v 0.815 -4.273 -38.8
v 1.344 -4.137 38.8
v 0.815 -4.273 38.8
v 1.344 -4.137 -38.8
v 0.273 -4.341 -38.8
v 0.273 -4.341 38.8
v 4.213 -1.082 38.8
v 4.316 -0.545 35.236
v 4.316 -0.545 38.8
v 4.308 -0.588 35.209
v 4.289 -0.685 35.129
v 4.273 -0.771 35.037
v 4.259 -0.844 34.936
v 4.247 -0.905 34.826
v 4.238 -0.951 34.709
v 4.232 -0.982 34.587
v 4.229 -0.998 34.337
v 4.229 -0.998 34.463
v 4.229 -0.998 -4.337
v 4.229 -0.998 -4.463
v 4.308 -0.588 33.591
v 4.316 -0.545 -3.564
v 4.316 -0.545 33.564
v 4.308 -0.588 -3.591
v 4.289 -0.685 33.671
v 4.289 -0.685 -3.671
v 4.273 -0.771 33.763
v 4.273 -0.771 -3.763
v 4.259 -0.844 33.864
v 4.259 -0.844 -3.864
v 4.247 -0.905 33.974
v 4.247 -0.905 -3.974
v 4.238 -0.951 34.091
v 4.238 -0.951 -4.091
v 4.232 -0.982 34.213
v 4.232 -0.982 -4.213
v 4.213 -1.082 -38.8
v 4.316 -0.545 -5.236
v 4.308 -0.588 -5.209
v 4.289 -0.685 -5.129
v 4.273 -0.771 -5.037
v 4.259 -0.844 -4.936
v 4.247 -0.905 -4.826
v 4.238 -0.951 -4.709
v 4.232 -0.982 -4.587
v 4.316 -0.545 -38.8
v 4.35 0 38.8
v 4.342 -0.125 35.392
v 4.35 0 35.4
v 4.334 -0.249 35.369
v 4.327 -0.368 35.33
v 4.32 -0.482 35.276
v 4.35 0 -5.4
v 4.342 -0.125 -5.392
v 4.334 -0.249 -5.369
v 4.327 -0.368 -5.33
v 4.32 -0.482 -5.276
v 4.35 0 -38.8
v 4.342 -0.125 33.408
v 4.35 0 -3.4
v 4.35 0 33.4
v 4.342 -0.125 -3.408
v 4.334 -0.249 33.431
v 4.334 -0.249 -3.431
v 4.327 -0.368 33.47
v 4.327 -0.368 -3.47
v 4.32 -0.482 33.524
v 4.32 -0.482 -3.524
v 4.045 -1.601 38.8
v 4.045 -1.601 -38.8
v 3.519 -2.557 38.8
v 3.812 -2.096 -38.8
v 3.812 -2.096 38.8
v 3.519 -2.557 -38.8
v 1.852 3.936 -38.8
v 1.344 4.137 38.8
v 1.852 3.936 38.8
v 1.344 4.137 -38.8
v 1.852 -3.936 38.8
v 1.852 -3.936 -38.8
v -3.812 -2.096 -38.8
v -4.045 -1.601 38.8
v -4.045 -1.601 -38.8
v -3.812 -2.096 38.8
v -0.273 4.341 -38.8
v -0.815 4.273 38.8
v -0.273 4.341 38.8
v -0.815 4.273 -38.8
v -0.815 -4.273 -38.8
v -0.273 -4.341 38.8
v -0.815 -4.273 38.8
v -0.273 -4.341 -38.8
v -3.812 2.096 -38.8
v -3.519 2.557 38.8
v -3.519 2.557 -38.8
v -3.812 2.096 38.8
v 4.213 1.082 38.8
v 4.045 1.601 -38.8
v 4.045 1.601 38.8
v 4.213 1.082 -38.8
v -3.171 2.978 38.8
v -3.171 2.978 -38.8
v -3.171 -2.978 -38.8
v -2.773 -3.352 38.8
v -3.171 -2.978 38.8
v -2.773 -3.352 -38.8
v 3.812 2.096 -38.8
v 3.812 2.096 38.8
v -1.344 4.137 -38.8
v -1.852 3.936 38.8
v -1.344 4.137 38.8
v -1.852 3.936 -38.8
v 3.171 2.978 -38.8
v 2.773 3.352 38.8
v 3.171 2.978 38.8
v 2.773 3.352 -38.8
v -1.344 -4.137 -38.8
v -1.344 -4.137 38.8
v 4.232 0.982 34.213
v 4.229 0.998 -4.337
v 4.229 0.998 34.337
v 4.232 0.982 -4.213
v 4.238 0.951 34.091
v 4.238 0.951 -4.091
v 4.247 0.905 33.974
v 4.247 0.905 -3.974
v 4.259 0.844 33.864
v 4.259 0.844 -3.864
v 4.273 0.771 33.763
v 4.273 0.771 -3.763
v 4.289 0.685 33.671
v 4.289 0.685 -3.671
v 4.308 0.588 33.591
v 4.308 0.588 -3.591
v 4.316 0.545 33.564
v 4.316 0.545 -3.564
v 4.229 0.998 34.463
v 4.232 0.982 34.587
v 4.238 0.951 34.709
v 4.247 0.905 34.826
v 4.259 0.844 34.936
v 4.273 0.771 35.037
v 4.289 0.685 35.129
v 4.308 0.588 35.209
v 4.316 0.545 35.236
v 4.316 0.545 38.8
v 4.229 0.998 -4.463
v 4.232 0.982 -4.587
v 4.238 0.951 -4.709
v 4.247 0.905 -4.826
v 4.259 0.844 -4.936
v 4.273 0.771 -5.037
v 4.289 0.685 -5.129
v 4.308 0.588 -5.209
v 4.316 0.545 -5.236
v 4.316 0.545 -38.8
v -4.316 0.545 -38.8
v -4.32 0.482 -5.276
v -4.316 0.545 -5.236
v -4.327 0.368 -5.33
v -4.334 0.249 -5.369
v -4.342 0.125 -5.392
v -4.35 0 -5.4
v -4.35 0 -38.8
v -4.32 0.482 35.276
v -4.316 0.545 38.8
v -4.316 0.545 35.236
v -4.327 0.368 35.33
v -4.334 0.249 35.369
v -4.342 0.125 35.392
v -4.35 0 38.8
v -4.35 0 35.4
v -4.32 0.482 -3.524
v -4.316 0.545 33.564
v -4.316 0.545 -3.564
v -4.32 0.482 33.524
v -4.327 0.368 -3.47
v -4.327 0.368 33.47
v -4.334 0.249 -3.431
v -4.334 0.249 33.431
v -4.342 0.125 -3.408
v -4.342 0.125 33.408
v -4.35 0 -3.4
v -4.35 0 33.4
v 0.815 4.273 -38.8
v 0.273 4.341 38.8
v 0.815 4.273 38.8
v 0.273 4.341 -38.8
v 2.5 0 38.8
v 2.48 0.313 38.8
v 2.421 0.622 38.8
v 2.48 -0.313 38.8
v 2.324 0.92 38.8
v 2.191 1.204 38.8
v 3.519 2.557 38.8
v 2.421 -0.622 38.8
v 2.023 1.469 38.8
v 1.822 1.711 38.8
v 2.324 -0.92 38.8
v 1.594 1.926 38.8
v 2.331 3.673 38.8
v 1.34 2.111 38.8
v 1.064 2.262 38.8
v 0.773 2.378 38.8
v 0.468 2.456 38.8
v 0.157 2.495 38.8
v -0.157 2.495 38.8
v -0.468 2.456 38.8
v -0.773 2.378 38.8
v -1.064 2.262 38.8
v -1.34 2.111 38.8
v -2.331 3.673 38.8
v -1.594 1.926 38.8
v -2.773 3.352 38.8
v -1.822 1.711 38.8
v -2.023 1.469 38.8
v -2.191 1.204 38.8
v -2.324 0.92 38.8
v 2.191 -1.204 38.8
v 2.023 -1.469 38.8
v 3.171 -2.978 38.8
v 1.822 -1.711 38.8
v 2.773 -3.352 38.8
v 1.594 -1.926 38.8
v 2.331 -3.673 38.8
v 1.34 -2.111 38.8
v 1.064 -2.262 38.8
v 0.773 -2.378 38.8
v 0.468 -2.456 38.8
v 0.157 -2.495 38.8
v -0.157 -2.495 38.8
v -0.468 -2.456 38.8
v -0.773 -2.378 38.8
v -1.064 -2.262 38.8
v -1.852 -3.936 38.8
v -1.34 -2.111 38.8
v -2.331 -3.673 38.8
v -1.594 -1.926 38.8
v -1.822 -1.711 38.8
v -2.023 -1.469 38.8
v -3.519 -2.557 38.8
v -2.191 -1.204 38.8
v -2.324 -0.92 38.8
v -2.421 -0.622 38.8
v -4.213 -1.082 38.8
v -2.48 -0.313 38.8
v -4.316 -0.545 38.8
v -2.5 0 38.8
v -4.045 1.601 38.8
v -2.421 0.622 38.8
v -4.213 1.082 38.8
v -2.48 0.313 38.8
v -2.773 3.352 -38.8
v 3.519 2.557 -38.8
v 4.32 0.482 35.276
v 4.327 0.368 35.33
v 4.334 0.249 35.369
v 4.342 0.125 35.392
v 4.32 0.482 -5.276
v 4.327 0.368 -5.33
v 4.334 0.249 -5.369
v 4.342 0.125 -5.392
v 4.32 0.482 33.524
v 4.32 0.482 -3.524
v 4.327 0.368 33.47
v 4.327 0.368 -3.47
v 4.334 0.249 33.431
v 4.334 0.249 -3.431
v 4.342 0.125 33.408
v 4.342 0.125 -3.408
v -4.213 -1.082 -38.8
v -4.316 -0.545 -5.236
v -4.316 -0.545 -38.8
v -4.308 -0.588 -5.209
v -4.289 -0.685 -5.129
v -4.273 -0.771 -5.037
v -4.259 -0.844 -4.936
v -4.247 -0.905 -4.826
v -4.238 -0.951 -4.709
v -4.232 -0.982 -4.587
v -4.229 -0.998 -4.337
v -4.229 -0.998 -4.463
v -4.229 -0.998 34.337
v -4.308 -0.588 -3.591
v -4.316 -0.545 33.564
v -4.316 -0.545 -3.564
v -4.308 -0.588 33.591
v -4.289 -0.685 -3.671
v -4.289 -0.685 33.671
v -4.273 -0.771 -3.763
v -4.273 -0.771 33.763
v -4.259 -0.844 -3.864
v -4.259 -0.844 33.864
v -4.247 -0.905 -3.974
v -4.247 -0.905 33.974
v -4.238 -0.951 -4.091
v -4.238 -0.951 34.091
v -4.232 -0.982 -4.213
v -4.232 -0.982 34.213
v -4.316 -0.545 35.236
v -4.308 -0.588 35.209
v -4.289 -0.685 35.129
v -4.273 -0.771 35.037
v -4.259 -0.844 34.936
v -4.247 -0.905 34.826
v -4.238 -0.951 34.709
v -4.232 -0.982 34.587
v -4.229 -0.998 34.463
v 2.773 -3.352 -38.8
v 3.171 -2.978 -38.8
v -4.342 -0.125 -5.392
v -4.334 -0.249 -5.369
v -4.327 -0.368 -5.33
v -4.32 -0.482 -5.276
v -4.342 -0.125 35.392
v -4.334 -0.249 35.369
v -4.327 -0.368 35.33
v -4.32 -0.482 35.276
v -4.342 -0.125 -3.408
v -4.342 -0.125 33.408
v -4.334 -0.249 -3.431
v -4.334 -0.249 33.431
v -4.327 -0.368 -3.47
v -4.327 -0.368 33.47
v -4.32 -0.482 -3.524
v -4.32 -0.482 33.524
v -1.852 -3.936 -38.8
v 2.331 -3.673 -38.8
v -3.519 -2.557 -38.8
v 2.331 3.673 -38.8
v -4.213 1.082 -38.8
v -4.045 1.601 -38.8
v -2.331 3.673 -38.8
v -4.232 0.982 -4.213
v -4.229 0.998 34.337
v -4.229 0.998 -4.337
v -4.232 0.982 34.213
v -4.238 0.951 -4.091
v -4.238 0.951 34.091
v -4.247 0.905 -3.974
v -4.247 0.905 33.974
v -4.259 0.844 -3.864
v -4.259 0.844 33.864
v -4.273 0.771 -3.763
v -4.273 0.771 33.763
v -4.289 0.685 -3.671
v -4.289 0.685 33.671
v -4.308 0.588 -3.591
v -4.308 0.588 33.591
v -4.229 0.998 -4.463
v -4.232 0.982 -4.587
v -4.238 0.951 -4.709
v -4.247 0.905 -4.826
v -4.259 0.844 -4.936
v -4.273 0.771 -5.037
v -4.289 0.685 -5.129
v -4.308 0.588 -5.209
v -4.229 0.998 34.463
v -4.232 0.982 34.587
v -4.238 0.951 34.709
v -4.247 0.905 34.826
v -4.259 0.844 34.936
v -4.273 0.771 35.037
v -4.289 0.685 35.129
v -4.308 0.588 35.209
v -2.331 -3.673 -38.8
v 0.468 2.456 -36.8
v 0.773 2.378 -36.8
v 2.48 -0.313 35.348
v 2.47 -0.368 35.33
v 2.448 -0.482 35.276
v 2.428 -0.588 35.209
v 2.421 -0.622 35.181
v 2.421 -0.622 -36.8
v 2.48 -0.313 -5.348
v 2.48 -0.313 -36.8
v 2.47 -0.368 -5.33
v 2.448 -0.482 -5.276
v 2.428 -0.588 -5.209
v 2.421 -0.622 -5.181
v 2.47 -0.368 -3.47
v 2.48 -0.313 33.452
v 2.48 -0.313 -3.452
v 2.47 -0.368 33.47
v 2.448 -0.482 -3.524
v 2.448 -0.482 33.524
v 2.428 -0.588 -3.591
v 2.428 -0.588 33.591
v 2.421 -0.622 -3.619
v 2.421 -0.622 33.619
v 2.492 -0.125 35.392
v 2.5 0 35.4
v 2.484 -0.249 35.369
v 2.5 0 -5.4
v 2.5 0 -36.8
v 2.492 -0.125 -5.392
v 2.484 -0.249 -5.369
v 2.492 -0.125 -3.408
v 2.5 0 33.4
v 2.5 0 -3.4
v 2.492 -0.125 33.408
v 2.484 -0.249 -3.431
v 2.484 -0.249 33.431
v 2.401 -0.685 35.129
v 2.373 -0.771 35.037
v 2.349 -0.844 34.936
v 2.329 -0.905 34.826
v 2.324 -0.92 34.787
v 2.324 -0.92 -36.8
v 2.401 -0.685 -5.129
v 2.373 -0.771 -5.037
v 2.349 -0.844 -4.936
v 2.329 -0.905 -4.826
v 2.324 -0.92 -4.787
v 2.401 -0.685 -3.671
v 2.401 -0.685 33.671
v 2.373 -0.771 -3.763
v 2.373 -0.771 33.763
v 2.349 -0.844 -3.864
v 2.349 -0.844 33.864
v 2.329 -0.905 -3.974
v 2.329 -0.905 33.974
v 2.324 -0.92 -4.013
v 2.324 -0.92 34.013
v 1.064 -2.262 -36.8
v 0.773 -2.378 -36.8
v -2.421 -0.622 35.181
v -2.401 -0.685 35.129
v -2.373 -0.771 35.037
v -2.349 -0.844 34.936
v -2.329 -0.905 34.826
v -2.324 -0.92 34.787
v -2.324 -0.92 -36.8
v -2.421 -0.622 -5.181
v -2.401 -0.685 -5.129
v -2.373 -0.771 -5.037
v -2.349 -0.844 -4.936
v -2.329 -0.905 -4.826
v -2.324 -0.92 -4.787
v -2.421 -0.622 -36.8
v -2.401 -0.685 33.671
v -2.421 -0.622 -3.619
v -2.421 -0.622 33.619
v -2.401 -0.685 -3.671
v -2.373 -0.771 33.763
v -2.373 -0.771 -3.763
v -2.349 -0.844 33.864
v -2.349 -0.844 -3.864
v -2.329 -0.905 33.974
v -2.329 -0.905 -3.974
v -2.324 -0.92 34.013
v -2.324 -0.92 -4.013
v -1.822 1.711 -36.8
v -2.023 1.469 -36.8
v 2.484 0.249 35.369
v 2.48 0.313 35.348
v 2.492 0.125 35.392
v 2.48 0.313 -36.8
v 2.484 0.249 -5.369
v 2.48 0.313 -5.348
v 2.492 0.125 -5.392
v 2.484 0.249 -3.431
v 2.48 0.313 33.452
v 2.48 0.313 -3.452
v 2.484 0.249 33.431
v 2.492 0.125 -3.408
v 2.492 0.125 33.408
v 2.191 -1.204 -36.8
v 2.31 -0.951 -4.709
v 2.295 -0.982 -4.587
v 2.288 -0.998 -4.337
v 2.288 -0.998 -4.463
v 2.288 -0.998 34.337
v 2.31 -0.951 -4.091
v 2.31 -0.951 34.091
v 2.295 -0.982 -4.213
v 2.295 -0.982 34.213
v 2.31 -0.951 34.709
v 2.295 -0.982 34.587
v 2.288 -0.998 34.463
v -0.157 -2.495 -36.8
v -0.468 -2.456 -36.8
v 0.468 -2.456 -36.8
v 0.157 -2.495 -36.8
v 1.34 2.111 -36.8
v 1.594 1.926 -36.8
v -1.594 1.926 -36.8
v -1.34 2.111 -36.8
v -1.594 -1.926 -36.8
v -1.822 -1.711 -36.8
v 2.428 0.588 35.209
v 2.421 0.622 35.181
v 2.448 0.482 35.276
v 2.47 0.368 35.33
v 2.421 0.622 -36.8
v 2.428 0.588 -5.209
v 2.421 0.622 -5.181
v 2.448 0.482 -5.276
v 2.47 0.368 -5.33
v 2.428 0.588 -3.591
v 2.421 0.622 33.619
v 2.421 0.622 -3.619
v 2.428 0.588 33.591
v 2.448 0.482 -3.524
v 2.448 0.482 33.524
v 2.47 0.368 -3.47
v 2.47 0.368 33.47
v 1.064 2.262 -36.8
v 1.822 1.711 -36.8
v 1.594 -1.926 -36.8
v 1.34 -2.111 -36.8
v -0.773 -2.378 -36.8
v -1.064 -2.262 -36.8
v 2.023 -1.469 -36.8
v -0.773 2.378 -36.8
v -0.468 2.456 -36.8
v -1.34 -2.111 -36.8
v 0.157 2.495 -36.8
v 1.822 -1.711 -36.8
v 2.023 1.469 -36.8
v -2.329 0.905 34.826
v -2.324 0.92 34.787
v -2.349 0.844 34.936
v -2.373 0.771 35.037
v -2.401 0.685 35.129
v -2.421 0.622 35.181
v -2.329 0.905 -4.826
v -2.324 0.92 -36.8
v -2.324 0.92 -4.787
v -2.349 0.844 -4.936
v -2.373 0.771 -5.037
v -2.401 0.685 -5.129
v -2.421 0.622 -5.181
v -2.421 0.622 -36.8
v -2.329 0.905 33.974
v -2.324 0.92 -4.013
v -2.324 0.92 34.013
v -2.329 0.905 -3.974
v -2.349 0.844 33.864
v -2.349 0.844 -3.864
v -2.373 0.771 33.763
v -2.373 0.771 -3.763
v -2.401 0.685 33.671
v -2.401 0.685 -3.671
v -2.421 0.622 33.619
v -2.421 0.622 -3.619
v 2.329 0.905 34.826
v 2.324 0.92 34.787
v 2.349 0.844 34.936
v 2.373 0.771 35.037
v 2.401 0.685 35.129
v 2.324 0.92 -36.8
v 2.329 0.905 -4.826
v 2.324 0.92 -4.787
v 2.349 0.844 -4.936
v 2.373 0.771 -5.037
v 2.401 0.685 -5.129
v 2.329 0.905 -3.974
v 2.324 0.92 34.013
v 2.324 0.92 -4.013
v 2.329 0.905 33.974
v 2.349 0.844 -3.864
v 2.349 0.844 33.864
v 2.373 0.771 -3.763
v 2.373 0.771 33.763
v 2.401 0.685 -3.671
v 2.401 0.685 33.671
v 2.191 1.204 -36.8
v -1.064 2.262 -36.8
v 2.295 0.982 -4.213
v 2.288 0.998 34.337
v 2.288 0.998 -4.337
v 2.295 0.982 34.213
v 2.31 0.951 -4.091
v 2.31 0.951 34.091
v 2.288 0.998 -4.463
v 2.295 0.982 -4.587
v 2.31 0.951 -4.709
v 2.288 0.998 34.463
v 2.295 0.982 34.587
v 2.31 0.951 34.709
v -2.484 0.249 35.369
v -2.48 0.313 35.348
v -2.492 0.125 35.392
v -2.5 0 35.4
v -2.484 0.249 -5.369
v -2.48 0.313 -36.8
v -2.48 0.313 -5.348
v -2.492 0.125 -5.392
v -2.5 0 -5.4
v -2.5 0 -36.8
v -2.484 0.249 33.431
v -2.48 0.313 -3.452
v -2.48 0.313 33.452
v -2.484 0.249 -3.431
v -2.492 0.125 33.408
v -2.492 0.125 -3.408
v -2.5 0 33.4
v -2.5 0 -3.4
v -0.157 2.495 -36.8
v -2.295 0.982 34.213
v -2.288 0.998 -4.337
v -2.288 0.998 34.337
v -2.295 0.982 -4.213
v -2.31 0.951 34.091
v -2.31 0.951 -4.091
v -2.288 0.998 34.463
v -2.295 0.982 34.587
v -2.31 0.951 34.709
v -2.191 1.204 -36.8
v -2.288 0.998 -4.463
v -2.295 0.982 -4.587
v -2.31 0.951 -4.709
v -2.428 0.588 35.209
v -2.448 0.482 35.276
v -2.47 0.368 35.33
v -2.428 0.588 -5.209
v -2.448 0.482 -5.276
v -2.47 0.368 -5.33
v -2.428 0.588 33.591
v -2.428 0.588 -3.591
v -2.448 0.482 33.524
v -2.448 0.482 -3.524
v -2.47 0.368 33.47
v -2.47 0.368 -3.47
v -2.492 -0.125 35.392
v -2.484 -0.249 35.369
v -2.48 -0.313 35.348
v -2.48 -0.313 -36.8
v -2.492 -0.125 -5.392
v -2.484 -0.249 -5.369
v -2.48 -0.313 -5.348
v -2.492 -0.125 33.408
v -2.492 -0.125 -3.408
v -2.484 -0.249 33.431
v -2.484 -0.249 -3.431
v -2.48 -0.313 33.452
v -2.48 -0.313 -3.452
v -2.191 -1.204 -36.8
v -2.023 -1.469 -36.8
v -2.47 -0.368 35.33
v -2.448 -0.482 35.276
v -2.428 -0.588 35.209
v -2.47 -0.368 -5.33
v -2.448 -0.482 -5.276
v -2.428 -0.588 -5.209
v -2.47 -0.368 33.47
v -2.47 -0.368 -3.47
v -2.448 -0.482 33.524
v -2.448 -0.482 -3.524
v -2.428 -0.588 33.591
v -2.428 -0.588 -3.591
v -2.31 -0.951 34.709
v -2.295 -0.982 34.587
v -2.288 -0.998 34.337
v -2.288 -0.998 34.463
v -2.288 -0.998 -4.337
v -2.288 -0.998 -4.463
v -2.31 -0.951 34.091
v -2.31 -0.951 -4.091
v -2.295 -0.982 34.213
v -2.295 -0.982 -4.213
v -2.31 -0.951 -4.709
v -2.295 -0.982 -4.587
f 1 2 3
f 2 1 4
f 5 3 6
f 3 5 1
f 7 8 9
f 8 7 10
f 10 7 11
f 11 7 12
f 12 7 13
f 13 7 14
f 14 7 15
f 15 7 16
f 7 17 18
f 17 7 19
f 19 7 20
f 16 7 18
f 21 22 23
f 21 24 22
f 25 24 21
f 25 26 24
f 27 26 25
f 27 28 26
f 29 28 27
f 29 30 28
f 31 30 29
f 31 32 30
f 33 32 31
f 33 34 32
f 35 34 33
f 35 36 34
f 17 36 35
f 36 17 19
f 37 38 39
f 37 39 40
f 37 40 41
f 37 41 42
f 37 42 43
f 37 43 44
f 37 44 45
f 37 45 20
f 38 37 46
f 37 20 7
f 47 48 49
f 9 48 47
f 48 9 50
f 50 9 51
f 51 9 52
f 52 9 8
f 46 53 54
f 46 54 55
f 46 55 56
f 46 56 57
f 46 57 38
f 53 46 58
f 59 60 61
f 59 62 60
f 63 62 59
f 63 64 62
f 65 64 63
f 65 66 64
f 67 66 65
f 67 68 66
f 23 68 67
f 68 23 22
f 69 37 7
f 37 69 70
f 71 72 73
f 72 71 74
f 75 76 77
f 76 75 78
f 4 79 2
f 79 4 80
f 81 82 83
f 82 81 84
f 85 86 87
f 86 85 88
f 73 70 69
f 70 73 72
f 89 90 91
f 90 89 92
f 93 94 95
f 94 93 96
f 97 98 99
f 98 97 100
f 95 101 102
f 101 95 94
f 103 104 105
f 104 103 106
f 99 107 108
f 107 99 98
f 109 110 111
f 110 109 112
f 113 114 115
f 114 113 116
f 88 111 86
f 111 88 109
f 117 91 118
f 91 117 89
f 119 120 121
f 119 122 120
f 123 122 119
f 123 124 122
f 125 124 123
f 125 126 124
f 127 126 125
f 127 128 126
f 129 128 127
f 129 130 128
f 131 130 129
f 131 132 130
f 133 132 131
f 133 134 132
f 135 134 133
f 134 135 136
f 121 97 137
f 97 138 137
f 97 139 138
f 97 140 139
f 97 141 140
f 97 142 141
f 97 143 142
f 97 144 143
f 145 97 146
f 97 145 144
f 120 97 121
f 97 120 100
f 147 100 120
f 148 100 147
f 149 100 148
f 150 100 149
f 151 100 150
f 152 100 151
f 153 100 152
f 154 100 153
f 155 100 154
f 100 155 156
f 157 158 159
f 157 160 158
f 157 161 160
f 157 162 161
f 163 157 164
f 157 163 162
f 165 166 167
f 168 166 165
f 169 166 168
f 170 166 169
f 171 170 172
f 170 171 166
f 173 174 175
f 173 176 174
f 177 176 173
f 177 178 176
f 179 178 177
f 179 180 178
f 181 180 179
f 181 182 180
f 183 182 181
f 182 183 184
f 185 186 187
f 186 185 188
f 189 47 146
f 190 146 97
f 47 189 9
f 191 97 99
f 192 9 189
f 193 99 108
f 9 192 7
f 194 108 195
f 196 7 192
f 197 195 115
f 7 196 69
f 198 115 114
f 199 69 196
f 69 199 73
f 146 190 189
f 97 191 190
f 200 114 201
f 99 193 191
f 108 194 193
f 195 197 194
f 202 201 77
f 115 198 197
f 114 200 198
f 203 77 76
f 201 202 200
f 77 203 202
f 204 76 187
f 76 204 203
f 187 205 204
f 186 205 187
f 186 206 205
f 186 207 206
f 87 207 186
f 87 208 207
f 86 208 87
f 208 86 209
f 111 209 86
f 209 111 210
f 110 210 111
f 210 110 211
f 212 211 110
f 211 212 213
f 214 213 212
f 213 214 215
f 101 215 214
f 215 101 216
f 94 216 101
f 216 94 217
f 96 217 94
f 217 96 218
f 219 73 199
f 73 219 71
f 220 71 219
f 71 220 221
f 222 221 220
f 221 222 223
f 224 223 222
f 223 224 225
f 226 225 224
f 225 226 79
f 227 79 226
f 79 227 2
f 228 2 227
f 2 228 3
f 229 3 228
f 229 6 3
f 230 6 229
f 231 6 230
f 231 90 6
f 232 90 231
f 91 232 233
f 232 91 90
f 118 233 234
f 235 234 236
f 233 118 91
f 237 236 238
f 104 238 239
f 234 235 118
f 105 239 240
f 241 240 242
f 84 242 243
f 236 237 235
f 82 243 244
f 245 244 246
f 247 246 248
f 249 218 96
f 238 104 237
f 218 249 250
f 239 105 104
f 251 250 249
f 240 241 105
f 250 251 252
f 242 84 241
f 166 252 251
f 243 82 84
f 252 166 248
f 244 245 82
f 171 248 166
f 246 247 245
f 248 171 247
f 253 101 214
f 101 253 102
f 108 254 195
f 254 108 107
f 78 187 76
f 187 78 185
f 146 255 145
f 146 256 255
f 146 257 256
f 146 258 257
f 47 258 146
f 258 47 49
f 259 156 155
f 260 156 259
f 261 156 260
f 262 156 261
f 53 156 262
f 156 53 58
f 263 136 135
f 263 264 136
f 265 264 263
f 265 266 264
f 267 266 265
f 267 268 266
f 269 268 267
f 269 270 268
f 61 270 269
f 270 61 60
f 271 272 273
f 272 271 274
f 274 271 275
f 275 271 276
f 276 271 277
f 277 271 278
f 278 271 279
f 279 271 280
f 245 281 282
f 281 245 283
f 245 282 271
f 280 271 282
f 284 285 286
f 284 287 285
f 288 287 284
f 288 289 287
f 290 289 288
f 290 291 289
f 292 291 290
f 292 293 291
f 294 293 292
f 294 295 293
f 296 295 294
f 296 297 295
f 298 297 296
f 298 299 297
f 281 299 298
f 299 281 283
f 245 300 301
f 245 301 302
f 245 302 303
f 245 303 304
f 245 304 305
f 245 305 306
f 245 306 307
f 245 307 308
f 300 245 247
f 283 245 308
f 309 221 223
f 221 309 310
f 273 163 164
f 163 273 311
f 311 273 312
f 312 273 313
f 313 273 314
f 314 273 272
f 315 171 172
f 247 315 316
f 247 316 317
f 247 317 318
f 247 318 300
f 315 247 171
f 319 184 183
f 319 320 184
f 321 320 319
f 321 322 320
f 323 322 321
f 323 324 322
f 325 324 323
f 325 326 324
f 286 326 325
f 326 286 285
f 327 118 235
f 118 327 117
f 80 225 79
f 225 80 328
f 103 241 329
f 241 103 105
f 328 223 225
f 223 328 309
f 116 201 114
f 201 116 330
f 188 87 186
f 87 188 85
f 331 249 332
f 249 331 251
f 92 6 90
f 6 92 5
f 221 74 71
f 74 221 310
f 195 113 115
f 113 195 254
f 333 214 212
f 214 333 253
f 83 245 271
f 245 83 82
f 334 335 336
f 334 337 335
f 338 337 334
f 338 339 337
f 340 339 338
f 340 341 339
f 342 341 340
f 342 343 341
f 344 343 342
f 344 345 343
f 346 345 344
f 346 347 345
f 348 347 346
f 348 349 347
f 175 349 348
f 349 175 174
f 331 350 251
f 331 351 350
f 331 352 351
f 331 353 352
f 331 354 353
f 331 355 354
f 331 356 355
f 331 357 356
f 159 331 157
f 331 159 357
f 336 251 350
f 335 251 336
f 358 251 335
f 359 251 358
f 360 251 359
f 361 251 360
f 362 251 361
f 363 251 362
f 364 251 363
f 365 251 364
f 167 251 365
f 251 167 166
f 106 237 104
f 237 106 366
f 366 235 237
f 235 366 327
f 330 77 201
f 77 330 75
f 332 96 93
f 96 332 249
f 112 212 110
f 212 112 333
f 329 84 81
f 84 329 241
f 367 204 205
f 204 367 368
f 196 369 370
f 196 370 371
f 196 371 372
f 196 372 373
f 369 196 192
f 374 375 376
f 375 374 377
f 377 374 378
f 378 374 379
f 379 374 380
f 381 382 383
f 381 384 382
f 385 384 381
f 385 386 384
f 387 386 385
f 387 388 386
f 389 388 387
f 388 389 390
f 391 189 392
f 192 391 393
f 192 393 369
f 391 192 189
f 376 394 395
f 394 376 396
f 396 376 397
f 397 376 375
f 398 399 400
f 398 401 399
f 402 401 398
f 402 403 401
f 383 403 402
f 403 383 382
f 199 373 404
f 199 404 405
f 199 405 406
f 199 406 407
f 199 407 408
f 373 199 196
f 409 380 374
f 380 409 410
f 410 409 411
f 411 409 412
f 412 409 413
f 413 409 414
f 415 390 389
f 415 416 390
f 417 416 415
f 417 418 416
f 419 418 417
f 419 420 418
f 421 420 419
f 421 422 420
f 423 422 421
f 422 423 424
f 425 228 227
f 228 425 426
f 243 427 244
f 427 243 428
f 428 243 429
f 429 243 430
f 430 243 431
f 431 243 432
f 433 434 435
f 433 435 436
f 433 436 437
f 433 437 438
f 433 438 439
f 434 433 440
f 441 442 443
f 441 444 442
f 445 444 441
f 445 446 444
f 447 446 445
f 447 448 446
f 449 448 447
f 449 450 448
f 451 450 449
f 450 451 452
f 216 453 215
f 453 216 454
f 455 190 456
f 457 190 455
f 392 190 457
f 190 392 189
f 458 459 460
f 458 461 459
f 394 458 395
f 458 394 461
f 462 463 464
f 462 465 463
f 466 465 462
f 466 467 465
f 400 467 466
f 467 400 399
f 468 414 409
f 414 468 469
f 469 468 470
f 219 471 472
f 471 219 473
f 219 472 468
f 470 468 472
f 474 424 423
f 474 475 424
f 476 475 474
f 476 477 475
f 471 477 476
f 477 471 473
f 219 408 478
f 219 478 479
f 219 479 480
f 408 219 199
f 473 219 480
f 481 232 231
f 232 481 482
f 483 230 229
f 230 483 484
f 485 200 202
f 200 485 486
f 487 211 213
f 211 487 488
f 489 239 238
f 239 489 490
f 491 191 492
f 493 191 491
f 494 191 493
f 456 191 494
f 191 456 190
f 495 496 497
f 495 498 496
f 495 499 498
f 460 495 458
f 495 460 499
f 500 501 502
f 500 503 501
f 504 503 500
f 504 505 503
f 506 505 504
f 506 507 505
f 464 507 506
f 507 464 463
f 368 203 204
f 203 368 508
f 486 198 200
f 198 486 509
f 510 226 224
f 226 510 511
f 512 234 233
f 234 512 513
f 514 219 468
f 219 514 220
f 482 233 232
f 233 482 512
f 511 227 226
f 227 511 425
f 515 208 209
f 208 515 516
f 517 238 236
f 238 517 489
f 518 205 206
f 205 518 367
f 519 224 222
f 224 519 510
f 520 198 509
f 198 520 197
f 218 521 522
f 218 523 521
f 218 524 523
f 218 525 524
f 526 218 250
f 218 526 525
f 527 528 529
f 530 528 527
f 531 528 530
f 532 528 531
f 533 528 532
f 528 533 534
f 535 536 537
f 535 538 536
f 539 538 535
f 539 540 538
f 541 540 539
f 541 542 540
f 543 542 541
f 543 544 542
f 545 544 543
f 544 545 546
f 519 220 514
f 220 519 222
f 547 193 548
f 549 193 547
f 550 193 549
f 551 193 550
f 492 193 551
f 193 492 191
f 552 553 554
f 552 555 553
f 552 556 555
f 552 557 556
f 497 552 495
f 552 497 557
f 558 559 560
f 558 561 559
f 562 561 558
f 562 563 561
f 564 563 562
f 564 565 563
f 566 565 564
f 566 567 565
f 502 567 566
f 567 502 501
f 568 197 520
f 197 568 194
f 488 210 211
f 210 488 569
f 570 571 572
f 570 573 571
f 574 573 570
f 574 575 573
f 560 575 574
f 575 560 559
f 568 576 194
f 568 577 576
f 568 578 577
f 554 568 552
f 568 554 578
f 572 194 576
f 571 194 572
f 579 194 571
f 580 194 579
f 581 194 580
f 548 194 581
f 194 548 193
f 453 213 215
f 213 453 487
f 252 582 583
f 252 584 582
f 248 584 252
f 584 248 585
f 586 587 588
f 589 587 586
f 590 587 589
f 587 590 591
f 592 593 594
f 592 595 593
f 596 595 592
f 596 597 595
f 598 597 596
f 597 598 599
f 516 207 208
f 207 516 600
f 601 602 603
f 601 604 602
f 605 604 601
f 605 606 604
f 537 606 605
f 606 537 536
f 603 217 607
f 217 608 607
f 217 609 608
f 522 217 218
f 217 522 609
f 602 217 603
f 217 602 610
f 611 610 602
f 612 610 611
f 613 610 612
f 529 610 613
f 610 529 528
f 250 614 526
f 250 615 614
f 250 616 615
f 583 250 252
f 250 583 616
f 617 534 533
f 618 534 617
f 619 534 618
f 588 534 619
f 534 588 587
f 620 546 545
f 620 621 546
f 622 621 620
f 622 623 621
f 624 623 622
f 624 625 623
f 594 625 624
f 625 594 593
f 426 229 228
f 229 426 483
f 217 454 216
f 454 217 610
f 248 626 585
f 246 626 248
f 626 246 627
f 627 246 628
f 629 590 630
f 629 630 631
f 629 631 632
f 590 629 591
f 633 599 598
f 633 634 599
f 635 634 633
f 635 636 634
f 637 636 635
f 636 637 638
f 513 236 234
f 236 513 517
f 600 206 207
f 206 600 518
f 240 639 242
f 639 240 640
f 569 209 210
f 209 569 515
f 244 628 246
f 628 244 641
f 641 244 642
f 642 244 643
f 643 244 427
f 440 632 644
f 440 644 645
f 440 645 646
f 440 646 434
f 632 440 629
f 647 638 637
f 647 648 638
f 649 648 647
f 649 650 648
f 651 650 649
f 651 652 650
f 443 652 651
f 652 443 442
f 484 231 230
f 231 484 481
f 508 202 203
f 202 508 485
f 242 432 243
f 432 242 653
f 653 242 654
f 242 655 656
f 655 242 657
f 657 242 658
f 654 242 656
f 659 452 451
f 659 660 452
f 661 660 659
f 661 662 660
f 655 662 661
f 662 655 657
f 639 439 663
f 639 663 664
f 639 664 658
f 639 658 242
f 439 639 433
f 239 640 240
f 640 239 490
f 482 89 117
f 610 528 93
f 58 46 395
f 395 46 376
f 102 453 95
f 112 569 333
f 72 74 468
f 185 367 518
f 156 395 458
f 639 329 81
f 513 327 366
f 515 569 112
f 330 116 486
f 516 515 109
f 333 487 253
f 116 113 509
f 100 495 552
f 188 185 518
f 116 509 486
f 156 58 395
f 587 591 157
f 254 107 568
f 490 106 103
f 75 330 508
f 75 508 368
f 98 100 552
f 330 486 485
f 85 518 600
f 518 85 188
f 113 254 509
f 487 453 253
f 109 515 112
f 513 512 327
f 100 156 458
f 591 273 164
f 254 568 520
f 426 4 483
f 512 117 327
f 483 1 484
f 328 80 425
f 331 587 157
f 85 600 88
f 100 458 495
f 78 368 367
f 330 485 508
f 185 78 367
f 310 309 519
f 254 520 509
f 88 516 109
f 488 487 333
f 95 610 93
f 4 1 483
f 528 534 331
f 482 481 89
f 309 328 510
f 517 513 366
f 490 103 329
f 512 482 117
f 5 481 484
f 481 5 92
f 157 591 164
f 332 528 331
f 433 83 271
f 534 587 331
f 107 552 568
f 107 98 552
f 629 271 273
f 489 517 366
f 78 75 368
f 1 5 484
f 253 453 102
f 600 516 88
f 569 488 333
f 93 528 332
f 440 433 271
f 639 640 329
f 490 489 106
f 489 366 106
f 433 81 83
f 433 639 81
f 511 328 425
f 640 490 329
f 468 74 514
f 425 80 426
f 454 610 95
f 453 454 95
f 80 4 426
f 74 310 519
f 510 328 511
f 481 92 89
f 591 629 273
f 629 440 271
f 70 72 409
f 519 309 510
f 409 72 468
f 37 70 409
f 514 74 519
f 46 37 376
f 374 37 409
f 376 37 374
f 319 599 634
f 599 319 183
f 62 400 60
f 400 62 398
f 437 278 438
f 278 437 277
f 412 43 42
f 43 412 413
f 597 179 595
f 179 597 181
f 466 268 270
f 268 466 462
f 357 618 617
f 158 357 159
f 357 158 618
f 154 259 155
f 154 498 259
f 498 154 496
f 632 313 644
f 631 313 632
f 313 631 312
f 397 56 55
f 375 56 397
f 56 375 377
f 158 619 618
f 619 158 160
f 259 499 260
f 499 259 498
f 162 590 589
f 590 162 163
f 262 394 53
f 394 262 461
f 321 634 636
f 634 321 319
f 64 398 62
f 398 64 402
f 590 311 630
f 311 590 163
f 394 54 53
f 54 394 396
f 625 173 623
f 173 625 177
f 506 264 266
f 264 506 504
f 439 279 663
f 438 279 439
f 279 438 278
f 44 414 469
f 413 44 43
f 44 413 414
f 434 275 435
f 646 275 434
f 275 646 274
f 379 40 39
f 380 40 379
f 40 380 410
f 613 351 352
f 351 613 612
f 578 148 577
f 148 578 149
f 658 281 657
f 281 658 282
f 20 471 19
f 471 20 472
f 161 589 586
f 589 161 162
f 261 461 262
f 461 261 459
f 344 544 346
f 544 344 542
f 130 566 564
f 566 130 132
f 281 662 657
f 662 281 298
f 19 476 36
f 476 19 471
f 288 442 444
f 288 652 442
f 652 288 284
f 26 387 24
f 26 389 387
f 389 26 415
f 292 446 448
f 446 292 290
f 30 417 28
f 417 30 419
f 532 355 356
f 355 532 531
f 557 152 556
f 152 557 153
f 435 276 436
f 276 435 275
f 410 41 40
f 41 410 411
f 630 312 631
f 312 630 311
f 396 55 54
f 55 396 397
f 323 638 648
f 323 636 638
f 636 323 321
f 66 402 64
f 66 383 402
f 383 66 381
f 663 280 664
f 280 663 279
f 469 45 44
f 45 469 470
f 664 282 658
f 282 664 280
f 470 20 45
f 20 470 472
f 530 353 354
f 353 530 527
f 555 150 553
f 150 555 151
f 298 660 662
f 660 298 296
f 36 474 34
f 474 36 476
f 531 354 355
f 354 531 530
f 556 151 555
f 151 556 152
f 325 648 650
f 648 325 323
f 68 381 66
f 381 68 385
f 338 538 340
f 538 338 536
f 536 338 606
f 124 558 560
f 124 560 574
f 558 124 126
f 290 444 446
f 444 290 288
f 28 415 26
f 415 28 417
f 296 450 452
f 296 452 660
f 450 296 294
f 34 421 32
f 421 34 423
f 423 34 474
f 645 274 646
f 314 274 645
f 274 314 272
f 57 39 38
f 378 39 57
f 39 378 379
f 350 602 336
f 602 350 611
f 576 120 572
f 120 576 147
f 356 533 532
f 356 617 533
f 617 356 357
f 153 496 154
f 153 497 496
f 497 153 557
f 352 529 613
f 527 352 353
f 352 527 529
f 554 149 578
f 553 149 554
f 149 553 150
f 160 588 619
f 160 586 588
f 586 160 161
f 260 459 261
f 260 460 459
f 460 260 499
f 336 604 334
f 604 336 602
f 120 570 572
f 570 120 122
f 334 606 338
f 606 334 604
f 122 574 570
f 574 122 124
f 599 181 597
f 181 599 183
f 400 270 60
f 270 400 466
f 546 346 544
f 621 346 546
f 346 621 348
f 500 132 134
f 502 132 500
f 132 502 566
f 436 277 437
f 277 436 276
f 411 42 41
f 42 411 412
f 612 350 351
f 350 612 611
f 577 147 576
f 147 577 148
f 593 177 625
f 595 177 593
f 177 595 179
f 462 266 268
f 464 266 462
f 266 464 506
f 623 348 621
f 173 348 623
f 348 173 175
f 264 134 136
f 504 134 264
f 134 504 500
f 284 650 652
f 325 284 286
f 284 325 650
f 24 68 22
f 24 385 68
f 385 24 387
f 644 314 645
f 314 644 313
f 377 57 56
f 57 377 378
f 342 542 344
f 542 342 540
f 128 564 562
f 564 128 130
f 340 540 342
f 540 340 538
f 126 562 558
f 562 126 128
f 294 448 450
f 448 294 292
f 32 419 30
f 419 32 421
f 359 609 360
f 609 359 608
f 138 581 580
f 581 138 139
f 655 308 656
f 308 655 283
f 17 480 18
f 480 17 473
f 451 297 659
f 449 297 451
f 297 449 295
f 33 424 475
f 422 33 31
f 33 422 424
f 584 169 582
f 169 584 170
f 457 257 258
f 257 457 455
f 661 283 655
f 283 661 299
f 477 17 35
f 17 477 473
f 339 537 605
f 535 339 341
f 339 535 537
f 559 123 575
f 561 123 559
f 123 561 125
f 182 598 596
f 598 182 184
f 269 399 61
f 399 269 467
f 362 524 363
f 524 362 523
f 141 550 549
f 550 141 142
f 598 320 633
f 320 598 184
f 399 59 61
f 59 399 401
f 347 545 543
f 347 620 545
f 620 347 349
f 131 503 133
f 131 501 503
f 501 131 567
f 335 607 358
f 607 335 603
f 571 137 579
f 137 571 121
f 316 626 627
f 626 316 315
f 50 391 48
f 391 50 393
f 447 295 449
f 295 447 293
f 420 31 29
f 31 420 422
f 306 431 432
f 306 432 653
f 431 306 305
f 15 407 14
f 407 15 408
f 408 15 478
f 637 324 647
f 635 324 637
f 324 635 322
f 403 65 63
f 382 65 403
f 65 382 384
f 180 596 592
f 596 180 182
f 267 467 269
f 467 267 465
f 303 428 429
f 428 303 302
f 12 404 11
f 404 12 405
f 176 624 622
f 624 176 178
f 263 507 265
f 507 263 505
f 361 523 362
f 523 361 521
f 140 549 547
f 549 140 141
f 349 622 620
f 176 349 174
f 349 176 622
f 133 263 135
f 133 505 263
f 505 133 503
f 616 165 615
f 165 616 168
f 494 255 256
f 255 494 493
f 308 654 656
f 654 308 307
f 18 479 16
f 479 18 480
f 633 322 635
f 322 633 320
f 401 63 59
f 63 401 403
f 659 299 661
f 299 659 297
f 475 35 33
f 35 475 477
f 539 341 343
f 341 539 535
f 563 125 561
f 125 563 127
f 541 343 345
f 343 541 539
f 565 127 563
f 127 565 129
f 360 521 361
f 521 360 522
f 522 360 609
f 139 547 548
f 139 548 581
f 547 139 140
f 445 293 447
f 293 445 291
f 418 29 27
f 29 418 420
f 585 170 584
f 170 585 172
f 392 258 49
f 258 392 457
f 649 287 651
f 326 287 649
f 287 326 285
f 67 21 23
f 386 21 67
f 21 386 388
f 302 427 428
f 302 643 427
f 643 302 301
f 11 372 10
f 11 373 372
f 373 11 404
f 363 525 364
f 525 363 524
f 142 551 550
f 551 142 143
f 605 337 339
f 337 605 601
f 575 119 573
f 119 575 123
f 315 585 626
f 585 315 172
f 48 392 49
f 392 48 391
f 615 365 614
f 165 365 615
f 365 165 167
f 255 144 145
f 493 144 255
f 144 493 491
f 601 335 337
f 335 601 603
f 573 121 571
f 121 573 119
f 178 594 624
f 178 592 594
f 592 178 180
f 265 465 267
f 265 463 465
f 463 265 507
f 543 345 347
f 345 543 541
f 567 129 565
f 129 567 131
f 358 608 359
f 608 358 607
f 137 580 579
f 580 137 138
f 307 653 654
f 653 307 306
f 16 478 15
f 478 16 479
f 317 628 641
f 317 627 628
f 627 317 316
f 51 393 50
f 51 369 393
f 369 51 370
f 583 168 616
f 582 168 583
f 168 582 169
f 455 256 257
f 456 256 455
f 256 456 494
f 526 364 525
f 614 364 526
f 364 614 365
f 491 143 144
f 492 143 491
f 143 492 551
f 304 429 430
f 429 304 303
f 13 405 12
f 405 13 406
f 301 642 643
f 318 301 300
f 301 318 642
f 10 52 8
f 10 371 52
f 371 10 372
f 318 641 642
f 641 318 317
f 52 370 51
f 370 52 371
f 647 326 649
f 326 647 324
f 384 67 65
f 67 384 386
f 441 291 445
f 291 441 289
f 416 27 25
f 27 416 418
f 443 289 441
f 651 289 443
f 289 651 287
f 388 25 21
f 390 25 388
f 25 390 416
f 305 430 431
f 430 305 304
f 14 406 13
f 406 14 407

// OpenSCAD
// file: redukce-civky-common.scad
include <redukce-civky-parametry.scad>

module barrel(length=10, r_inner=5, r_outer=9 ) {
    difference(){
        //straight_pipe3d(r_inner=barrel_inner_r, r_outer=barrel_outer_r, length=length);
        //translate ([0,0,0.5*(length-2)]) cylinder(h=2,r2 = 0.5*8.7, r1=0.5*5, center=true);
        
        /* genericka verze pro hlaven */
        
        straight_pipe3d(r_inner=r_inner, r_outer=r_outer, length=length);
        translate ([0,0,0.5*(length-2)]) cylinder(h=2,r2 = r_outer, r1=r_inner, center=true);
        
    }//difference
}//module



module xray(){
    difference(){
        //barrel();
        children();
        translate ([0,15,0]) cube([100,30,100],center=true);
    }//diff
}//module
// file: redukce-civky-parametry.scad
/* generické parametry pro cívky a jejich spojení, které tu řešíme */
barrel_inner_r = 0.5*5;
barrel_outer_r = 0.5*8.7;
intercoil_spacing = 8.8;
barrel_halflength = 15;
LED_r = 3;
LED_length=8;
// file: ../_lib_/cap3d.scad
module cap3d(outer_radius=20, height=10, walls_thickness=2, top_thickness=-1){
    /* module for round lid cap*/
    top_thickness = top_thickness <0 ? walls_thickness : top_thickness;
    r_outer = outer_radius;
    h_outer = height;
    r_inner = outer_radius - walls_thickness;
    h_inner = height - top_thickness;
    inner_z_offset = top_thickness;
    
    difference(){
        color("blue")cylinder(h=h_outer ,r=r_outer ,center=true); //outer
        translate([0,0,top_thickness]) color("red")cylinder(h=h_inner ,r=r_inner ,center=true); //inner
        }//difference
    } //module
    
  $fn=90;
//  cap3d(top_thickness=0);
// file: ../_lib_/straight_pipe3d.scad
module straight_pipe3d(r_inner=4, r_outer=6, length=10){

        difference(){
            color("blue")cylinder(h=length ,r=r_outer ,center=true); //outer
            color("red") cylinder(h=length ,r=r_inner ,center=true); //inner
        }//difference

    }//module
    
/*
$fn=60;
translate([0,0,-3]) straight_pipe3d();
translate([0,3,0]) rotate([90,0,0]) straight_pipe3d();
    */
// main file
include <../_lib_/straight_pipe3d.scad>
include <../_lib_/cap3d.scad>
include <redukce-civky-parametry.scad>
include <redukce-civky-common.scad>


$fn= 50;


module barrel_with_sensor_holes() {
    
    //walls_thickness=overlaping_part_r-barrel_inner_r;
    //walls_thickness2=overlaping_part_r-barrel_outer_r;
    
    LED_hole_r = max(1, 0.3333*LED_r);
    barrell_length = (2*barrel_halflength+intercoil_spacing)*2;
    barrel_begin_z = -1*(2*barrel_halflength+intercoil_spacing);
    
    holes_spacing = [2*barrel_halflength+0.5*intercoil_spacing,
                     2*barrel_halflength+0.5*intercoil_spacing+0.5*intercoil_spacing+2*barrel_halflength+0.5*intercoil_spacing];
    
    holes_position = holes_spacing + [barrel_begin_z,barrel_begin_z]; 
    //holes_position = holes_spacing ;
    echo(holes_spacing);
    
    
    difference(){
        color("blue")rotate ([180,0,0]) barrel(length=barrell_length, r_inner=barrel_inner_r, r_outer=barrel_outer_r);
        union(){
            translate([0,0,holes_position[0]]) rotate ([0,90,0]) color("red") cylinder(h=20, r=LED_hole_r, center=true);
            translate([0,0,holes_position[1]]) rotate ([0,90,0]) color("red") cylinder(h=20, r=LED_hole_r, center=true);
            }//union
    
    }//difference
}//module

module LED_section(){
    difference(){
        straight_pipe3d(r_inner=1.1*barrel_outer_r, r_outer=11, length=intercoil_spacing);
        rotate ([0,90,0]) color("red") cylinder(h=120, r=LED_r, center=true);
        }//difference
    }//module

//projection(cut=true) rotate([0,90,0])barrel_with_sensor();
//xray() barrel_with_sensor();
barrel_with_sensor_holes();
//LED_section();
//barrel();
